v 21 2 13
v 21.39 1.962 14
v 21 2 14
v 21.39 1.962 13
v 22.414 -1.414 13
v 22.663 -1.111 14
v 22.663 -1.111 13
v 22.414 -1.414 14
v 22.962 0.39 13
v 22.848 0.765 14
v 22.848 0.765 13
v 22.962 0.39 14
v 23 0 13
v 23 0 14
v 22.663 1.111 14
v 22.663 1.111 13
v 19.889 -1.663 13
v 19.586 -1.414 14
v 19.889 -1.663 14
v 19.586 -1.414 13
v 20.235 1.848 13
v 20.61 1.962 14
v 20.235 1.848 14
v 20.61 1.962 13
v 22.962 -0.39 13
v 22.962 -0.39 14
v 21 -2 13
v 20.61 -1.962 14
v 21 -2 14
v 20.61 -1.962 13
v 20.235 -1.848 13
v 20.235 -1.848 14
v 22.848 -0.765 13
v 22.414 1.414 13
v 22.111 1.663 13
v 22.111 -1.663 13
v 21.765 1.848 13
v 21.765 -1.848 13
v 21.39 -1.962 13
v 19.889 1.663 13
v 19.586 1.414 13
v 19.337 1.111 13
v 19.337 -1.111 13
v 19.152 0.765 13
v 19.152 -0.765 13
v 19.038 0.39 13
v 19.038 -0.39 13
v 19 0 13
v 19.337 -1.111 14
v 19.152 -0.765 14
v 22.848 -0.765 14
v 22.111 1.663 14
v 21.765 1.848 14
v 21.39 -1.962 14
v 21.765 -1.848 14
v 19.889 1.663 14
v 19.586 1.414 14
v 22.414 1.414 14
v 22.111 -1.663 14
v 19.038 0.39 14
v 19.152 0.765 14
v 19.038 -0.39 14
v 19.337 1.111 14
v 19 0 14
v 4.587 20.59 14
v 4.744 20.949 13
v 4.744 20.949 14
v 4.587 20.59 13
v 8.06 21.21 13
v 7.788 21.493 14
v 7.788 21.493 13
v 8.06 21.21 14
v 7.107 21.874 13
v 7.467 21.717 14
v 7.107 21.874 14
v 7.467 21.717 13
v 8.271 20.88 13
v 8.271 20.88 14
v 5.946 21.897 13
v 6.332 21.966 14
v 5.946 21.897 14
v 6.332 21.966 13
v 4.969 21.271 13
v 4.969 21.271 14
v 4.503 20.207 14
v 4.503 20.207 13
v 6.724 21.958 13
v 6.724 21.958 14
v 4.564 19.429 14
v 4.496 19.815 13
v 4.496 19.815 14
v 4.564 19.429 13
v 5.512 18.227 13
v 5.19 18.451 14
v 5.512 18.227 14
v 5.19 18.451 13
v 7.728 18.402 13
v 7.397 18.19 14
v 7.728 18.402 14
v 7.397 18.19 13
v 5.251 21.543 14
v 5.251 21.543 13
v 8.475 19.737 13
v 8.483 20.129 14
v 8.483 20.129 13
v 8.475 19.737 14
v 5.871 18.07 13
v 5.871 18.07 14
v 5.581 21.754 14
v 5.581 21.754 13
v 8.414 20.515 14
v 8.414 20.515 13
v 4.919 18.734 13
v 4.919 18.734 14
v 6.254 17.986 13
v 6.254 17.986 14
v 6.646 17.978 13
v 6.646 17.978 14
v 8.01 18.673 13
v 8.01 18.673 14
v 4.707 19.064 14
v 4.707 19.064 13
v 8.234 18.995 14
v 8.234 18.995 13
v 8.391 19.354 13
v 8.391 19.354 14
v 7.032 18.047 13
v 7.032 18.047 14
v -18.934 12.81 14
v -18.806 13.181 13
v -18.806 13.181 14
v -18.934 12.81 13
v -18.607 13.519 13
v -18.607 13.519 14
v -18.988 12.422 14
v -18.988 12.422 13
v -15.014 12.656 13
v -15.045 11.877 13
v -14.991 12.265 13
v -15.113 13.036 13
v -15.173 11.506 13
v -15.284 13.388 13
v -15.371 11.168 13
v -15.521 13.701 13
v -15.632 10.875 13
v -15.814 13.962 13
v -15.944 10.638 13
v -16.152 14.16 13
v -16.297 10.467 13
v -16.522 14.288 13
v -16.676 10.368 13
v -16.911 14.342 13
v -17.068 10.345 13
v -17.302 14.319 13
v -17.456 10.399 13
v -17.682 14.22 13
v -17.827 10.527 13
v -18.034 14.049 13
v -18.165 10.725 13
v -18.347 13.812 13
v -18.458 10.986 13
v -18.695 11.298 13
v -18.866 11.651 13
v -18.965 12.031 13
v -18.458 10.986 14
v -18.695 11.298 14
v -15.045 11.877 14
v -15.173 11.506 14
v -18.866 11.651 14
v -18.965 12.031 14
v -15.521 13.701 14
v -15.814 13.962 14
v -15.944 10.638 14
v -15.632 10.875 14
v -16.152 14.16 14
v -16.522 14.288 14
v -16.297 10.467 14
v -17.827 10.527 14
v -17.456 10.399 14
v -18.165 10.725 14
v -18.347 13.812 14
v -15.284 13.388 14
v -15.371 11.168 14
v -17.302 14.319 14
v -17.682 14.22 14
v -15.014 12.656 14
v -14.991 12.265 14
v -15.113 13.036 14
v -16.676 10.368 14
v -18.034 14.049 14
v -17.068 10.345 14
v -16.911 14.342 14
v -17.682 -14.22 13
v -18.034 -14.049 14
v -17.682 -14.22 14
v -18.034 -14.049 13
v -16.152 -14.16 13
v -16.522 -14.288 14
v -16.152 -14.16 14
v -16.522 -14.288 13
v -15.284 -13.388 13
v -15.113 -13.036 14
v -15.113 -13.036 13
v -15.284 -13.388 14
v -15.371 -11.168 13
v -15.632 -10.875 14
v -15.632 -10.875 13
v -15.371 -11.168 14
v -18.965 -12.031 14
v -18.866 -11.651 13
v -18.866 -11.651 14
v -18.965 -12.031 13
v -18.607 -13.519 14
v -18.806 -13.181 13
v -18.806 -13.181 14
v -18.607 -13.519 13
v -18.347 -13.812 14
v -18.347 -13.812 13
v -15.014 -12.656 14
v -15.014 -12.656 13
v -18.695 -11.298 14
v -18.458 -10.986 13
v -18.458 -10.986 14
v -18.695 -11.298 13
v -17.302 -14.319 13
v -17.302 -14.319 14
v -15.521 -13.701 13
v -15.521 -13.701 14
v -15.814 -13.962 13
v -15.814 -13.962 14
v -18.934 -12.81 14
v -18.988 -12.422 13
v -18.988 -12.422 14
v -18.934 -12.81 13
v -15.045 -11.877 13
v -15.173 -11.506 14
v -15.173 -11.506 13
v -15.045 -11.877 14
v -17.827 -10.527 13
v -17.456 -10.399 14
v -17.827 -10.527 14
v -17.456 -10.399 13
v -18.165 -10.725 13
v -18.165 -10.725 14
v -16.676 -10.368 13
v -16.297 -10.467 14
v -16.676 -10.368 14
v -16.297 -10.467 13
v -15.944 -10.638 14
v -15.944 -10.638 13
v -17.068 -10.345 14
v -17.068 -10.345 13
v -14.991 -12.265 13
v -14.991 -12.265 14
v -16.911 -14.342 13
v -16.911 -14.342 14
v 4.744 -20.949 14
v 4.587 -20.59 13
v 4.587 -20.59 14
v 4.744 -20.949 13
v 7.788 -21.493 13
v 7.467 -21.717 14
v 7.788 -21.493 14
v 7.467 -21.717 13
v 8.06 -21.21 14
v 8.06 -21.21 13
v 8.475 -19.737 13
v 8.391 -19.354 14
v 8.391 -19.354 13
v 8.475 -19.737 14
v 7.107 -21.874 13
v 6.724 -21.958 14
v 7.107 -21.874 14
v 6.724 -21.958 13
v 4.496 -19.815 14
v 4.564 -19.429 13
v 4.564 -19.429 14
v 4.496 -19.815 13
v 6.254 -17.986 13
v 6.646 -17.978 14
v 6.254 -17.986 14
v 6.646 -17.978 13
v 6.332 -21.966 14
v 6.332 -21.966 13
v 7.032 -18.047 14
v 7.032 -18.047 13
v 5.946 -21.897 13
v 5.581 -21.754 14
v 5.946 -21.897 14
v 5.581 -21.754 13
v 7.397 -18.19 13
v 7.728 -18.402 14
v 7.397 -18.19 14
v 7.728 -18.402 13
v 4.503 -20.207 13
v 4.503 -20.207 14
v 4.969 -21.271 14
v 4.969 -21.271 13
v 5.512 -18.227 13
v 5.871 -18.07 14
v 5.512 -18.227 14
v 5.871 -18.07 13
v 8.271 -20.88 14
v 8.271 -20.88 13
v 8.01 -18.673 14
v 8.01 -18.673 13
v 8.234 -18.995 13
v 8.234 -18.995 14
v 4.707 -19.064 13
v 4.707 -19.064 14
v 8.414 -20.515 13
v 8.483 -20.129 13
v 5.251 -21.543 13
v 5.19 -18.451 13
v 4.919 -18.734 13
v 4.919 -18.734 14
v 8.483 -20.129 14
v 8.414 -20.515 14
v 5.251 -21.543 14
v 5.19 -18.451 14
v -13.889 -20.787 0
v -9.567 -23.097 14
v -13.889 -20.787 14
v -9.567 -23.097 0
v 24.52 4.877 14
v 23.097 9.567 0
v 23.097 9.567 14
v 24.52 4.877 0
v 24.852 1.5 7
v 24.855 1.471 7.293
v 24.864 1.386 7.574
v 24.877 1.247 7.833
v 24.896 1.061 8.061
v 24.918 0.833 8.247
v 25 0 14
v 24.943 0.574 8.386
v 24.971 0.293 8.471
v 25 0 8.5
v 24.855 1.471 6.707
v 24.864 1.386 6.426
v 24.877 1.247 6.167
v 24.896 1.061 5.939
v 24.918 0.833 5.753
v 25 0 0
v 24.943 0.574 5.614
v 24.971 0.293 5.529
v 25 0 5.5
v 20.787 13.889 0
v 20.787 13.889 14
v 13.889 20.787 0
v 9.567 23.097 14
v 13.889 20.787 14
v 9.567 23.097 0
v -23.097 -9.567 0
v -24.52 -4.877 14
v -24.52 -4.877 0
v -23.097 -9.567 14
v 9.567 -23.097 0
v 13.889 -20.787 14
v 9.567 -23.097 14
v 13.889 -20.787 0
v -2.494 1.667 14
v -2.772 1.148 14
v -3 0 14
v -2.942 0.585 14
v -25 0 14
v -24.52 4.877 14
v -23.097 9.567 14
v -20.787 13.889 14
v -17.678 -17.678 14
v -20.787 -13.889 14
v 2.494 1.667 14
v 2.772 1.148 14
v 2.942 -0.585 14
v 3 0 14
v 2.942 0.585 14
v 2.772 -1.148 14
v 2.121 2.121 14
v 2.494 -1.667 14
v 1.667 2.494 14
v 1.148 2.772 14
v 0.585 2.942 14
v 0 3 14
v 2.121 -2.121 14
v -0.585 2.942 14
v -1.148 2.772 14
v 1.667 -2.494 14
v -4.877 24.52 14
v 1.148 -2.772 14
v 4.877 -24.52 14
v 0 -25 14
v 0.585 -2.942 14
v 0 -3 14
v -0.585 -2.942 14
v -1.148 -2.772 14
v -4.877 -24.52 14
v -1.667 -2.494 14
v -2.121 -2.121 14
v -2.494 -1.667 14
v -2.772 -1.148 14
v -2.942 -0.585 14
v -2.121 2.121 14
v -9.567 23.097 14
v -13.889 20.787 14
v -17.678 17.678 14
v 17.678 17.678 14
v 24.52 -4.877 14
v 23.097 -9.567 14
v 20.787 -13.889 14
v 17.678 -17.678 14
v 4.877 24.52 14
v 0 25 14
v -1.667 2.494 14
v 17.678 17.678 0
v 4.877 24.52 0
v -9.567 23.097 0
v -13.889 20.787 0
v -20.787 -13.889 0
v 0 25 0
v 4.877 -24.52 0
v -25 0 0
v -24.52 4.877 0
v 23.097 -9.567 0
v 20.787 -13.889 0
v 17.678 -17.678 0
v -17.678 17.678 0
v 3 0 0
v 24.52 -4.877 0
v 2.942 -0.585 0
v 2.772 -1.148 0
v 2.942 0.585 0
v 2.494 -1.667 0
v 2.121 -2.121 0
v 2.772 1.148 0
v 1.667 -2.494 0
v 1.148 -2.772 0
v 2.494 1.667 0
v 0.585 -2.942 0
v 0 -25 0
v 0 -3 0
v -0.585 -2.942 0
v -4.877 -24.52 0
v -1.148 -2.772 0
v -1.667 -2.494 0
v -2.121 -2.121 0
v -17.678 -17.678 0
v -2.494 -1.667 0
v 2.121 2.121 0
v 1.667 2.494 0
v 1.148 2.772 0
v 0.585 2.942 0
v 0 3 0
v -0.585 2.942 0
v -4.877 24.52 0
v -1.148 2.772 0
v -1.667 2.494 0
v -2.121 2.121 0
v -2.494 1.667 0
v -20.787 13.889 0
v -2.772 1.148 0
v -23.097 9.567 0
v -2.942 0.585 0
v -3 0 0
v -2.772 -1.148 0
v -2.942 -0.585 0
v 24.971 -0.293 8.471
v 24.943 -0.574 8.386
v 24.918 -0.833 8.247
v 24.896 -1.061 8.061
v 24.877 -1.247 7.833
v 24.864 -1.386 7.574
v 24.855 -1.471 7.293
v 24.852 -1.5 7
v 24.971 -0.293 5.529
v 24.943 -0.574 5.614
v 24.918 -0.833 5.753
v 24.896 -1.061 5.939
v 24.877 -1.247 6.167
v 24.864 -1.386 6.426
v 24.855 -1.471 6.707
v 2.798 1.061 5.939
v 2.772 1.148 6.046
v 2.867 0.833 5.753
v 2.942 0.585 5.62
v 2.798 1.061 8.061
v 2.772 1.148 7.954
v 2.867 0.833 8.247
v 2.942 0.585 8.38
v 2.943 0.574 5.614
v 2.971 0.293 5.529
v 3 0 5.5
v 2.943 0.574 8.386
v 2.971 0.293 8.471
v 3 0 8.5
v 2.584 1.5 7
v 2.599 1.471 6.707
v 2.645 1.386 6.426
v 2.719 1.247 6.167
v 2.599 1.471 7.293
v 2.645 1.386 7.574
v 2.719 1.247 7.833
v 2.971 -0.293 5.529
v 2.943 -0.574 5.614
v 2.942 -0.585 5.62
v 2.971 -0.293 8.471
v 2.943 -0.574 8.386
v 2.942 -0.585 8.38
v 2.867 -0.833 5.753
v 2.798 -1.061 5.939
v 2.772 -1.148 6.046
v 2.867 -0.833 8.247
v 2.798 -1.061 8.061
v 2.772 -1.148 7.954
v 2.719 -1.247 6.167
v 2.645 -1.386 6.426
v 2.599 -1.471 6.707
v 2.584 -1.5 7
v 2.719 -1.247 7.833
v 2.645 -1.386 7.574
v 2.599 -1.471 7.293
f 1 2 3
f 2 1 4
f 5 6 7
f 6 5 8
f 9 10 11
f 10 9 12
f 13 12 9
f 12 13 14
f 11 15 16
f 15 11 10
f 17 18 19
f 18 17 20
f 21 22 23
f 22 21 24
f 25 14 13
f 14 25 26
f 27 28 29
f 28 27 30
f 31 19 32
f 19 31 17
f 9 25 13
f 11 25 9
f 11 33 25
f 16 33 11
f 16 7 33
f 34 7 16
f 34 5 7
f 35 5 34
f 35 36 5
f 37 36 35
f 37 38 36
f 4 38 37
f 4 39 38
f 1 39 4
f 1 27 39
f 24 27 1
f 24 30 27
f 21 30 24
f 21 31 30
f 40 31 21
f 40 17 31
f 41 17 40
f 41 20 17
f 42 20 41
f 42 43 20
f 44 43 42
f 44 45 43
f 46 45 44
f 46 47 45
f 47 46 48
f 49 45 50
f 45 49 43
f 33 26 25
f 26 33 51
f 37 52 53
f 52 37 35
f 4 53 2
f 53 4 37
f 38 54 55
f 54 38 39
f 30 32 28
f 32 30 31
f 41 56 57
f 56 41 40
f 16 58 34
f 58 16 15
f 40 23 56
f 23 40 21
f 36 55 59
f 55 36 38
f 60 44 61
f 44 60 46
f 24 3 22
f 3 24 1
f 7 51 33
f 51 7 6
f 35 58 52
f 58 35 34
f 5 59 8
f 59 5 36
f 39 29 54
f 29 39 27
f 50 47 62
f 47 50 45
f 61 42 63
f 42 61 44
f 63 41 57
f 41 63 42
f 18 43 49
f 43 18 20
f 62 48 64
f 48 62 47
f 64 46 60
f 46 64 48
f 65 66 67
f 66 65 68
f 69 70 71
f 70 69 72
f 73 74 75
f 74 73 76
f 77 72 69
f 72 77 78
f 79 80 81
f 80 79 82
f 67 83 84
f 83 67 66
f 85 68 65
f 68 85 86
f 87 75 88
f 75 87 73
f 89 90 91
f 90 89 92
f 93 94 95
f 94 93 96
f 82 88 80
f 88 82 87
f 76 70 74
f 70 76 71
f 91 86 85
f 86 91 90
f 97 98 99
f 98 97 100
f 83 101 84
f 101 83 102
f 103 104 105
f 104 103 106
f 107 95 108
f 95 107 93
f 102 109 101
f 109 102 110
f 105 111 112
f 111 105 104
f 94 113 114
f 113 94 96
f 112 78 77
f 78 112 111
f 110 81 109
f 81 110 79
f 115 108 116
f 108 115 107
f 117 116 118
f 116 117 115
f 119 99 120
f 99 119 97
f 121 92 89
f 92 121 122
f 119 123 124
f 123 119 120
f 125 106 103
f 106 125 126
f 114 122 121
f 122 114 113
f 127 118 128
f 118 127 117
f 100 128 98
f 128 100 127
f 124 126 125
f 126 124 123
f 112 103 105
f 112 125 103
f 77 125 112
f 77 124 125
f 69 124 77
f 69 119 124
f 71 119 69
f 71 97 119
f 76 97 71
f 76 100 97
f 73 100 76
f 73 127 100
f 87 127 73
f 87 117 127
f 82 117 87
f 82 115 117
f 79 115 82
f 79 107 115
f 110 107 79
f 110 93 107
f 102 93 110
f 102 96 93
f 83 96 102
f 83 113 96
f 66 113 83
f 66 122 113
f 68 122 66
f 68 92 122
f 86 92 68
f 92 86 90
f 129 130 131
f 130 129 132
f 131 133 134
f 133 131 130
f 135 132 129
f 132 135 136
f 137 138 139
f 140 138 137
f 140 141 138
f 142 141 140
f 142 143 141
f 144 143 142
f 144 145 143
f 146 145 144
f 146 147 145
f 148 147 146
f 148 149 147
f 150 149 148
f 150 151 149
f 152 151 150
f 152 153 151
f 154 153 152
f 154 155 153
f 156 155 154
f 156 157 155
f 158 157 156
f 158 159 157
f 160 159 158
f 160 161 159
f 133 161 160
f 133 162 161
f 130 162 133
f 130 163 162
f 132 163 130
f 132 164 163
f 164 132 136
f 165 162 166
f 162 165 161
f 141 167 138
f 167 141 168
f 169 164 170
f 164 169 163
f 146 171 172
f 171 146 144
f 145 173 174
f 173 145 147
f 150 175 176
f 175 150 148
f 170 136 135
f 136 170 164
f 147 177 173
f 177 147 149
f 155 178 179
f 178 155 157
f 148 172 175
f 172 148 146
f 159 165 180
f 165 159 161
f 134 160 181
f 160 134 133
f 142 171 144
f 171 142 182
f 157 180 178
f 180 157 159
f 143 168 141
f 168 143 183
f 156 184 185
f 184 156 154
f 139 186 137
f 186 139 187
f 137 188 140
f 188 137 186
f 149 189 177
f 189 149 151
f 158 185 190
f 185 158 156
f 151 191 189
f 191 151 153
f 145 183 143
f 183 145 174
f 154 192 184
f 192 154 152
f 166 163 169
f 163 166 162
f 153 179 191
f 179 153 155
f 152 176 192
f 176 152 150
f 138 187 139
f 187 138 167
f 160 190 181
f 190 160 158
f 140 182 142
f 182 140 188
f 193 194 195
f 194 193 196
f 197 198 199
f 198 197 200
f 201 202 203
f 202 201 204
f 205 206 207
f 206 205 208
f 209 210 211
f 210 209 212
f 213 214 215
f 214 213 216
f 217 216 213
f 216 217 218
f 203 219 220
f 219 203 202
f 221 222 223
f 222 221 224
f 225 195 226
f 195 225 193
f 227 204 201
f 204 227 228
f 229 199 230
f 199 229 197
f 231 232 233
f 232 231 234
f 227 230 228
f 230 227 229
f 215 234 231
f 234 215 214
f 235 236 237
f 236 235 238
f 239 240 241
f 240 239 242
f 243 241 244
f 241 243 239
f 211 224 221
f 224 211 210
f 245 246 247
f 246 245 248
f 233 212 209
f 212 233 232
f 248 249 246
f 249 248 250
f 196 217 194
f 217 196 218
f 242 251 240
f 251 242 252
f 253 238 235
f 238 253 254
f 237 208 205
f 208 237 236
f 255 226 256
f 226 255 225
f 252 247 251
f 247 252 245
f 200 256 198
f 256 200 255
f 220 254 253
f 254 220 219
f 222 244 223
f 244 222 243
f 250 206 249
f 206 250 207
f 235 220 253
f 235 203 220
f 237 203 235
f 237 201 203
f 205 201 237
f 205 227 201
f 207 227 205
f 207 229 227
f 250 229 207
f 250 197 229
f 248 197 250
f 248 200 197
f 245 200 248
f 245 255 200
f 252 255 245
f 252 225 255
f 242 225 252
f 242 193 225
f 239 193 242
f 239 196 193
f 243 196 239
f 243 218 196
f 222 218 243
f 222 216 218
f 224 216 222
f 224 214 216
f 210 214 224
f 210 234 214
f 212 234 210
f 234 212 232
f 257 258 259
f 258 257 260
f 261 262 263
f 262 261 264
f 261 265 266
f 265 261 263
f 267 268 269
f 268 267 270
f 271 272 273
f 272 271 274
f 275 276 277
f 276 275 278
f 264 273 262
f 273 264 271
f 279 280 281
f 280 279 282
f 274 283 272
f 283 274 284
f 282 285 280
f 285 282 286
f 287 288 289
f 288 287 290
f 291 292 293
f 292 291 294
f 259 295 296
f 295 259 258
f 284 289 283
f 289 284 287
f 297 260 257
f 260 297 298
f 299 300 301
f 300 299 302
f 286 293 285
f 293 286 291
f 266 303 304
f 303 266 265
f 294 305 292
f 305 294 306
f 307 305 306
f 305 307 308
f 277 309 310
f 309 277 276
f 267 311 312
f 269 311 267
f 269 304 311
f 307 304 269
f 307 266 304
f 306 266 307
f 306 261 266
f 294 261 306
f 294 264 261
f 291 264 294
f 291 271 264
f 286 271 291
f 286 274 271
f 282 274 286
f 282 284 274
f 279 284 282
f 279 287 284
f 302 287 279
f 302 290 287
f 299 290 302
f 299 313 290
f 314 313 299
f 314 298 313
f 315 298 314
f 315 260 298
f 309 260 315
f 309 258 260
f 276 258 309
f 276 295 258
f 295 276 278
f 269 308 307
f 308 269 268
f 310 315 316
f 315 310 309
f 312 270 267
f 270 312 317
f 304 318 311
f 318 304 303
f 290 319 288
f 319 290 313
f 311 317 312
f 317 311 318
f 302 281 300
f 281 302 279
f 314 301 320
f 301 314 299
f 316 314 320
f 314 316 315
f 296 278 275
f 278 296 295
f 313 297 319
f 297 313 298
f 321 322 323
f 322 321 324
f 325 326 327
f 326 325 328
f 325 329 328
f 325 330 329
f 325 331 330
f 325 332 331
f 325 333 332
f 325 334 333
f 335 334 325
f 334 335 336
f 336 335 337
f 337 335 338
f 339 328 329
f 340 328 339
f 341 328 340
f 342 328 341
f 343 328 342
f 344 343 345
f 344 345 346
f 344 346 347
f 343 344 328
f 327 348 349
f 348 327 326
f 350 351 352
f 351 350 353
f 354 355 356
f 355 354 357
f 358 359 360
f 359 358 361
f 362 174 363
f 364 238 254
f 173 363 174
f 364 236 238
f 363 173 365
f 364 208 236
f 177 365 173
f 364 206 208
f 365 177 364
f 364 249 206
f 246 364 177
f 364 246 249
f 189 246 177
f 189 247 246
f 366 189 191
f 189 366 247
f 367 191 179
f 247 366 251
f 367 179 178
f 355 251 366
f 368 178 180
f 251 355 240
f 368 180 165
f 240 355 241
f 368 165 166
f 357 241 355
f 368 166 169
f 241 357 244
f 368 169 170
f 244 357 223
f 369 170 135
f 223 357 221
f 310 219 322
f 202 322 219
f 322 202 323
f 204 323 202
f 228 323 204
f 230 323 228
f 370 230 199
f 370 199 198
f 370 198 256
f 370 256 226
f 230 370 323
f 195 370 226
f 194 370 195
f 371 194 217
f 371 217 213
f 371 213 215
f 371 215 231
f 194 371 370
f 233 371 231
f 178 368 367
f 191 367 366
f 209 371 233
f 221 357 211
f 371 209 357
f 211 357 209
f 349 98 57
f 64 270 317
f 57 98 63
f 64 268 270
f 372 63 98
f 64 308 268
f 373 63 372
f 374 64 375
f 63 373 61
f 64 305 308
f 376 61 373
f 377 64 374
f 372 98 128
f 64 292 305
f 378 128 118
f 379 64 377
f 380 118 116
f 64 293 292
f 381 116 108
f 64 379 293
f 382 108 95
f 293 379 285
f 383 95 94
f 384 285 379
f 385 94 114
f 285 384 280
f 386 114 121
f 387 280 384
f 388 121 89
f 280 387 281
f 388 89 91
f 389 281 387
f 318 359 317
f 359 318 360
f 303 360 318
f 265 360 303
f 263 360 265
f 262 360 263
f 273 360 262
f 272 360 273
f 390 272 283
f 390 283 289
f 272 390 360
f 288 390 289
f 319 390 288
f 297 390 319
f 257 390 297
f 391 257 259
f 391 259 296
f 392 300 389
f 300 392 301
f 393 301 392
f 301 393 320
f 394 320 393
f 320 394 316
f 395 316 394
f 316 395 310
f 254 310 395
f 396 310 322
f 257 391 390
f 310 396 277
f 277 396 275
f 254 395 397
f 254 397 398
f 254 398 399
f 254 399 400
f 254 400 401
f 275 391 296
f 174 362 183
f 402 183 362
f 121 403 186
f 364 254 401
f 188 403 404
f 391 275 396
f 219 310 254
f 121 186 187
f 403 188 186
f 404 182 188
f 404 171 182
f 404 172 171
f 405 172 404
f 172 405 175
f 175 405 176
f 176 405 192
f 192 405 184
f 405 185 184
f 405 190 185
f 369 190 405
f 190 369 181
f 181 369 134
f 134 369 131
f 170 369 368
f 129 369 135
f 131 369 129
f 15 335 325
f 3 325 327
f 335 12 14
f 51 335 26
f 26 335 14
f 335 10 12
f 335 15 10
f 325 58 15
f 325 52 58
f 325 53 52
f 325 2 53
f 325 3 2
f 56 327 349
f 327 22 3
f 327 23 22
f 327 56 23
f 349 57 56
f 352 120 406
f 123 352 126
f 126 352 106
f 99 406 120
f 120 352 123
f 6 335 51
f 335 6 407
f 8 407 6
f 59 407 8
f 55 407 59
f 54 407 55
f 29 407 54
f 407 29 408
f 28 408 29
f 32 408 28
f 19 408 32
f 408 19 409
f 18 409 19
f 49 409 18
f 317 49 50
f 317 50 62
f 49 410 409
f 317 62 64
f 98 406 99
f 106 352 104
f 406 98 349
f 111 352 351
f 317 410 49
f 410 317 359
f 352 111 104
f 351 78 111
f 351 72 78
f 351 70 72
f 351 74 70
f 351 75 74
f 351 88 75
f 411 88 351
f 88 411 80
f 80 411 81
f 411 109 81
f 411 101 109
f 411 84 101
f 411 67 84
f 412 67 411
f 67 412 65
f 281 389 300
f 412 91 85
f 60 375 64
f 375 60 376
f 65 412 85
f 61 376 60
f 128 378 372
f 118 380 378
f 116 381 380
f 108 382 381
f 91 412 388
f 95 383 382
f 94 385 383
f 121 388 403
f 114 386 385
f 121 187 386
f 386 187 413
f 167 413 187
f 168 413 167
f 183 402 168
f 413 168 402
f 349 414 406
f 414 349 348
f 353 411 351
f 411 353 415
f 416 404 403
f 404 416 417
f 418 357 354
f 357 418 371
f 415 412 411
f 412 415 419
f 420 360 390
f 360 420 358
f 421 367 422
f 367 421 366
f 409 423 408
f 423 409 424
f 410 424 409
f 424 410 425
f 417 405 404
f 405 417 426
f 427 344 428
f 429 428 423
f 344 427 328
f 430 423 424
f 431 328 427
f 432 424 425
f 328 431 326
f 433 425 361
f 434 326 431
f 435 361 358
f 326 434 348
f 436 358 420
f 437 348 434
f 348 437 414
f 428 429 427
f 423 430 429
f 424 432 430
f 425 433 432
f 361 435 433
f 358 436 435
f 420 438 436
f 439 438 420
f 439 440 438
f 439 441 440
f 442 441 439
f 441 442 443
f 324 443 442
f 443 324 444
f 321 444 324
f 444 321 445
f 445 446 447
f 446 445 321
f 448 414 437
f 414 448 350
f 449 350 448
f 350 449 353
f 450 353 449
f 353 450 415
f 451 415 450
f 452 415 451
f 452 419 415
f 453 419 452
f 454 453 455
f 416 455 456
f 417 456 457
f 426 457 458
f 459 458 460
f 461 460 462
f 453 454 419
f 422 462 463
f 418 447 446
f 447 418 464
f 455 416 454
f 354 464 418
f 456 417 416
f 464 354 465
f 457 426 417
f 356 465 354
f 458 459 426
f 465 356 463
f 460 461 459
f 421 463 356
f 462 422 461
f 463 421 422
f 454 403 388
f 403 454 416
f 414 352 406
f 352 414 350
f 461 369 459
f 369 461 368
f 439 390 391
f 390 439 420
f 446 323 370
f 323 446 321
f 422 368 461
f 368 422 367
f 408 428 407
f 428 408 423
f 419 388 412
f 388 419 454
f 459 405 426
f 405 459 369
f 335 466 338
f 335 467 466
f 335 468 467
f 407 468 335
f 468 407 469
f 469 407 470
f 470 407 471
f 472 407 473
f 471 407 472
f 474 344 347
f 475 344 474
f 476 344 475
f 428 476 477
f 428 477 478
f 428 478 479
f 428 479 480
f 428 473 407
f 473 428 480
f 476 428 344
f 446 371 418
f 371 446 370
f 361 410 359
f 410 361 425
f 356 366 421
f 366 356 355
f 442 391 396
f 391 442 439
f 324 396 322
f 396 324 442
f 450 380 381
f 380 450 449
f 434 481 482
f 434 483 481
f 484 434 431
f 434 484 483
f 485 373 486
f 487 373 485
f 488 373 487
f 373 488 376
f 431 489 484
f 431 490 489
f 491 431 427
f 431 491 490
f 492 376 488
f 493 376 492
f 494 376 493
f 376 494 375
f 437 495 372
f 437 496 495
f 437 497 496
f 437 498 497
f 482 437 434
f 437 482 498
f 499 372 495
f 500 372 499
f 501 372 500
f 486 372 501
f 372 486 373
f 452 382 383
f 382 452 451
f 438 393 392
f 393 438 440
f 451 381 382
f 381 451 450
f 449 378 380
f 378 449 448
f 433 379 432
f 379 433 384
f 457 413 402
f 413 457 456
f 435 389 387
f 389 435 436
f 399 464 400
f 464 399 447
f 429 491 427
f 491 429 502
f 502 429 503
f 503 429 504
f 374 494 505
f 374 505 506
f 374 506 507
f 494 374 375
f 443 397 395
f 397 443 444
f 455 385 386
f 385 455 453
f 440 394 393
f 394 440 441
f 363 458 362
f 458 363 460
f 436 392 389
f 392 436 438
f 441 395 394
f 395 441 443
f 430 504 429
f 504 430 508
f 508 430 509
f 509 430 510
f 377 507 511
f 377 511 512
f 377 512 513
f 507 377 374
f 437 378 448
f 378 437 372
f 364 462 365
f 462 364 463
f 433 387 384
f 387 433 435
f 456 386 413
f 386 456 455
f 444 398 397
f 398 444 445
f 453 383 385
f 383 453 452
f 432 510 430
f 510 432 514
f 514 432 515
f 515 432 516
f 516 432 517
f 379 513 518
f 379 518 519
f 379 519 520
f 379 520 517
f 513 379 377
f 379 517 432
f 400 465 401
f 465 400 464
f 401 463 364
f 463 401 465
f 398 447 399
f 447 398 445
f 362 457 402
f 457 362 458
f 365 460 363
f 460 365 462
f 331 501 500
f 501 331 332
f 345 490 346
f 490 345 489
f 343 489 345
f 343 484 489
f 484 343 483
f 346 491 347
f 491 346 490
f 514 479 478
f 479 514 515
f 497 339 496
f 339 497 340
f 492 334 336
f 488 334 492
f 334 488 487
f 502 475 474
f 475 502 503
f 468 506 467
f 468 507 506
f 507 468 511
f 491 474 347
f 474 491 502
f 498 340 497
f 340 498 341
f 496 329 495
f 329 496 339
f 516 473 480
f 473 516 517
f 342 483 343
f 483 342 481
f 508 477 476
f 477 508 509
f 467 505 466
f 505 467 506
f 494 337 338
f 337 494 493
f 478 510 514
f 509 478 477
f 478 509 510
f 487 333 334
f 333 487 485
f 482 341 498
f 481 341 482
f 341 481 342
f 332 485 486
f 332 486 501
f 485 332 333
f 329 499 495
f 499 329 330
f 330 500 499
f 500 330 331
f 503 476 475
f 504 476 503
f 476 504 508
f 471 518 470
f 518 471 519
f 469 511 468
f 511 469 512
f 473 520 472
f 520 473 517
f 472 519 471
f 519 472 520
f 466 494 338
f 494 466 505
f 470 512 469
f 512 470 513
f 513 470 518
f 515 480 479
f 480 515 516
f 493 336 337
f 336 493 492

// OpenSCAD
$fn = 32;

// ----------------------------------------------------------------------
// Control knob: dimpled knob
// ----------------------------------------------------------------------

// --- parameters (mm) ---
dimp_d = 4;               // finger dimple diameter
n_dimp = 5;               // number of dimples
dimp_r = 21;              // dimple ring radius
knob_d = 50;              // knob body diameter
knob_h = 14;              // knob body height
bore_d = 6;               // shaft bore diameter
set_d = 3;                // set screw bore diameter

dimp_step = 360 / n_dimp;  // dimple angular step

difference() {
  cylinder(h = knob_h, d = knob_d);
  translate([0, 0, -1]) cylinder(h = knob_h + 2, d = bore_d);
  translate([-1, 0, knob_h / 2]) rotate([0, 90, 0])
    cylinder(h = knob_d / 2 + bore_d / 2 + 2, d = set_d);  for (i = [0 : n_dimp - 1])
    rotate([0, 0, i * dimp_step])
      translate([dimp_r, 0, knob_h - 1])
        cylinder(h = 2, d = dimp_d);
}
